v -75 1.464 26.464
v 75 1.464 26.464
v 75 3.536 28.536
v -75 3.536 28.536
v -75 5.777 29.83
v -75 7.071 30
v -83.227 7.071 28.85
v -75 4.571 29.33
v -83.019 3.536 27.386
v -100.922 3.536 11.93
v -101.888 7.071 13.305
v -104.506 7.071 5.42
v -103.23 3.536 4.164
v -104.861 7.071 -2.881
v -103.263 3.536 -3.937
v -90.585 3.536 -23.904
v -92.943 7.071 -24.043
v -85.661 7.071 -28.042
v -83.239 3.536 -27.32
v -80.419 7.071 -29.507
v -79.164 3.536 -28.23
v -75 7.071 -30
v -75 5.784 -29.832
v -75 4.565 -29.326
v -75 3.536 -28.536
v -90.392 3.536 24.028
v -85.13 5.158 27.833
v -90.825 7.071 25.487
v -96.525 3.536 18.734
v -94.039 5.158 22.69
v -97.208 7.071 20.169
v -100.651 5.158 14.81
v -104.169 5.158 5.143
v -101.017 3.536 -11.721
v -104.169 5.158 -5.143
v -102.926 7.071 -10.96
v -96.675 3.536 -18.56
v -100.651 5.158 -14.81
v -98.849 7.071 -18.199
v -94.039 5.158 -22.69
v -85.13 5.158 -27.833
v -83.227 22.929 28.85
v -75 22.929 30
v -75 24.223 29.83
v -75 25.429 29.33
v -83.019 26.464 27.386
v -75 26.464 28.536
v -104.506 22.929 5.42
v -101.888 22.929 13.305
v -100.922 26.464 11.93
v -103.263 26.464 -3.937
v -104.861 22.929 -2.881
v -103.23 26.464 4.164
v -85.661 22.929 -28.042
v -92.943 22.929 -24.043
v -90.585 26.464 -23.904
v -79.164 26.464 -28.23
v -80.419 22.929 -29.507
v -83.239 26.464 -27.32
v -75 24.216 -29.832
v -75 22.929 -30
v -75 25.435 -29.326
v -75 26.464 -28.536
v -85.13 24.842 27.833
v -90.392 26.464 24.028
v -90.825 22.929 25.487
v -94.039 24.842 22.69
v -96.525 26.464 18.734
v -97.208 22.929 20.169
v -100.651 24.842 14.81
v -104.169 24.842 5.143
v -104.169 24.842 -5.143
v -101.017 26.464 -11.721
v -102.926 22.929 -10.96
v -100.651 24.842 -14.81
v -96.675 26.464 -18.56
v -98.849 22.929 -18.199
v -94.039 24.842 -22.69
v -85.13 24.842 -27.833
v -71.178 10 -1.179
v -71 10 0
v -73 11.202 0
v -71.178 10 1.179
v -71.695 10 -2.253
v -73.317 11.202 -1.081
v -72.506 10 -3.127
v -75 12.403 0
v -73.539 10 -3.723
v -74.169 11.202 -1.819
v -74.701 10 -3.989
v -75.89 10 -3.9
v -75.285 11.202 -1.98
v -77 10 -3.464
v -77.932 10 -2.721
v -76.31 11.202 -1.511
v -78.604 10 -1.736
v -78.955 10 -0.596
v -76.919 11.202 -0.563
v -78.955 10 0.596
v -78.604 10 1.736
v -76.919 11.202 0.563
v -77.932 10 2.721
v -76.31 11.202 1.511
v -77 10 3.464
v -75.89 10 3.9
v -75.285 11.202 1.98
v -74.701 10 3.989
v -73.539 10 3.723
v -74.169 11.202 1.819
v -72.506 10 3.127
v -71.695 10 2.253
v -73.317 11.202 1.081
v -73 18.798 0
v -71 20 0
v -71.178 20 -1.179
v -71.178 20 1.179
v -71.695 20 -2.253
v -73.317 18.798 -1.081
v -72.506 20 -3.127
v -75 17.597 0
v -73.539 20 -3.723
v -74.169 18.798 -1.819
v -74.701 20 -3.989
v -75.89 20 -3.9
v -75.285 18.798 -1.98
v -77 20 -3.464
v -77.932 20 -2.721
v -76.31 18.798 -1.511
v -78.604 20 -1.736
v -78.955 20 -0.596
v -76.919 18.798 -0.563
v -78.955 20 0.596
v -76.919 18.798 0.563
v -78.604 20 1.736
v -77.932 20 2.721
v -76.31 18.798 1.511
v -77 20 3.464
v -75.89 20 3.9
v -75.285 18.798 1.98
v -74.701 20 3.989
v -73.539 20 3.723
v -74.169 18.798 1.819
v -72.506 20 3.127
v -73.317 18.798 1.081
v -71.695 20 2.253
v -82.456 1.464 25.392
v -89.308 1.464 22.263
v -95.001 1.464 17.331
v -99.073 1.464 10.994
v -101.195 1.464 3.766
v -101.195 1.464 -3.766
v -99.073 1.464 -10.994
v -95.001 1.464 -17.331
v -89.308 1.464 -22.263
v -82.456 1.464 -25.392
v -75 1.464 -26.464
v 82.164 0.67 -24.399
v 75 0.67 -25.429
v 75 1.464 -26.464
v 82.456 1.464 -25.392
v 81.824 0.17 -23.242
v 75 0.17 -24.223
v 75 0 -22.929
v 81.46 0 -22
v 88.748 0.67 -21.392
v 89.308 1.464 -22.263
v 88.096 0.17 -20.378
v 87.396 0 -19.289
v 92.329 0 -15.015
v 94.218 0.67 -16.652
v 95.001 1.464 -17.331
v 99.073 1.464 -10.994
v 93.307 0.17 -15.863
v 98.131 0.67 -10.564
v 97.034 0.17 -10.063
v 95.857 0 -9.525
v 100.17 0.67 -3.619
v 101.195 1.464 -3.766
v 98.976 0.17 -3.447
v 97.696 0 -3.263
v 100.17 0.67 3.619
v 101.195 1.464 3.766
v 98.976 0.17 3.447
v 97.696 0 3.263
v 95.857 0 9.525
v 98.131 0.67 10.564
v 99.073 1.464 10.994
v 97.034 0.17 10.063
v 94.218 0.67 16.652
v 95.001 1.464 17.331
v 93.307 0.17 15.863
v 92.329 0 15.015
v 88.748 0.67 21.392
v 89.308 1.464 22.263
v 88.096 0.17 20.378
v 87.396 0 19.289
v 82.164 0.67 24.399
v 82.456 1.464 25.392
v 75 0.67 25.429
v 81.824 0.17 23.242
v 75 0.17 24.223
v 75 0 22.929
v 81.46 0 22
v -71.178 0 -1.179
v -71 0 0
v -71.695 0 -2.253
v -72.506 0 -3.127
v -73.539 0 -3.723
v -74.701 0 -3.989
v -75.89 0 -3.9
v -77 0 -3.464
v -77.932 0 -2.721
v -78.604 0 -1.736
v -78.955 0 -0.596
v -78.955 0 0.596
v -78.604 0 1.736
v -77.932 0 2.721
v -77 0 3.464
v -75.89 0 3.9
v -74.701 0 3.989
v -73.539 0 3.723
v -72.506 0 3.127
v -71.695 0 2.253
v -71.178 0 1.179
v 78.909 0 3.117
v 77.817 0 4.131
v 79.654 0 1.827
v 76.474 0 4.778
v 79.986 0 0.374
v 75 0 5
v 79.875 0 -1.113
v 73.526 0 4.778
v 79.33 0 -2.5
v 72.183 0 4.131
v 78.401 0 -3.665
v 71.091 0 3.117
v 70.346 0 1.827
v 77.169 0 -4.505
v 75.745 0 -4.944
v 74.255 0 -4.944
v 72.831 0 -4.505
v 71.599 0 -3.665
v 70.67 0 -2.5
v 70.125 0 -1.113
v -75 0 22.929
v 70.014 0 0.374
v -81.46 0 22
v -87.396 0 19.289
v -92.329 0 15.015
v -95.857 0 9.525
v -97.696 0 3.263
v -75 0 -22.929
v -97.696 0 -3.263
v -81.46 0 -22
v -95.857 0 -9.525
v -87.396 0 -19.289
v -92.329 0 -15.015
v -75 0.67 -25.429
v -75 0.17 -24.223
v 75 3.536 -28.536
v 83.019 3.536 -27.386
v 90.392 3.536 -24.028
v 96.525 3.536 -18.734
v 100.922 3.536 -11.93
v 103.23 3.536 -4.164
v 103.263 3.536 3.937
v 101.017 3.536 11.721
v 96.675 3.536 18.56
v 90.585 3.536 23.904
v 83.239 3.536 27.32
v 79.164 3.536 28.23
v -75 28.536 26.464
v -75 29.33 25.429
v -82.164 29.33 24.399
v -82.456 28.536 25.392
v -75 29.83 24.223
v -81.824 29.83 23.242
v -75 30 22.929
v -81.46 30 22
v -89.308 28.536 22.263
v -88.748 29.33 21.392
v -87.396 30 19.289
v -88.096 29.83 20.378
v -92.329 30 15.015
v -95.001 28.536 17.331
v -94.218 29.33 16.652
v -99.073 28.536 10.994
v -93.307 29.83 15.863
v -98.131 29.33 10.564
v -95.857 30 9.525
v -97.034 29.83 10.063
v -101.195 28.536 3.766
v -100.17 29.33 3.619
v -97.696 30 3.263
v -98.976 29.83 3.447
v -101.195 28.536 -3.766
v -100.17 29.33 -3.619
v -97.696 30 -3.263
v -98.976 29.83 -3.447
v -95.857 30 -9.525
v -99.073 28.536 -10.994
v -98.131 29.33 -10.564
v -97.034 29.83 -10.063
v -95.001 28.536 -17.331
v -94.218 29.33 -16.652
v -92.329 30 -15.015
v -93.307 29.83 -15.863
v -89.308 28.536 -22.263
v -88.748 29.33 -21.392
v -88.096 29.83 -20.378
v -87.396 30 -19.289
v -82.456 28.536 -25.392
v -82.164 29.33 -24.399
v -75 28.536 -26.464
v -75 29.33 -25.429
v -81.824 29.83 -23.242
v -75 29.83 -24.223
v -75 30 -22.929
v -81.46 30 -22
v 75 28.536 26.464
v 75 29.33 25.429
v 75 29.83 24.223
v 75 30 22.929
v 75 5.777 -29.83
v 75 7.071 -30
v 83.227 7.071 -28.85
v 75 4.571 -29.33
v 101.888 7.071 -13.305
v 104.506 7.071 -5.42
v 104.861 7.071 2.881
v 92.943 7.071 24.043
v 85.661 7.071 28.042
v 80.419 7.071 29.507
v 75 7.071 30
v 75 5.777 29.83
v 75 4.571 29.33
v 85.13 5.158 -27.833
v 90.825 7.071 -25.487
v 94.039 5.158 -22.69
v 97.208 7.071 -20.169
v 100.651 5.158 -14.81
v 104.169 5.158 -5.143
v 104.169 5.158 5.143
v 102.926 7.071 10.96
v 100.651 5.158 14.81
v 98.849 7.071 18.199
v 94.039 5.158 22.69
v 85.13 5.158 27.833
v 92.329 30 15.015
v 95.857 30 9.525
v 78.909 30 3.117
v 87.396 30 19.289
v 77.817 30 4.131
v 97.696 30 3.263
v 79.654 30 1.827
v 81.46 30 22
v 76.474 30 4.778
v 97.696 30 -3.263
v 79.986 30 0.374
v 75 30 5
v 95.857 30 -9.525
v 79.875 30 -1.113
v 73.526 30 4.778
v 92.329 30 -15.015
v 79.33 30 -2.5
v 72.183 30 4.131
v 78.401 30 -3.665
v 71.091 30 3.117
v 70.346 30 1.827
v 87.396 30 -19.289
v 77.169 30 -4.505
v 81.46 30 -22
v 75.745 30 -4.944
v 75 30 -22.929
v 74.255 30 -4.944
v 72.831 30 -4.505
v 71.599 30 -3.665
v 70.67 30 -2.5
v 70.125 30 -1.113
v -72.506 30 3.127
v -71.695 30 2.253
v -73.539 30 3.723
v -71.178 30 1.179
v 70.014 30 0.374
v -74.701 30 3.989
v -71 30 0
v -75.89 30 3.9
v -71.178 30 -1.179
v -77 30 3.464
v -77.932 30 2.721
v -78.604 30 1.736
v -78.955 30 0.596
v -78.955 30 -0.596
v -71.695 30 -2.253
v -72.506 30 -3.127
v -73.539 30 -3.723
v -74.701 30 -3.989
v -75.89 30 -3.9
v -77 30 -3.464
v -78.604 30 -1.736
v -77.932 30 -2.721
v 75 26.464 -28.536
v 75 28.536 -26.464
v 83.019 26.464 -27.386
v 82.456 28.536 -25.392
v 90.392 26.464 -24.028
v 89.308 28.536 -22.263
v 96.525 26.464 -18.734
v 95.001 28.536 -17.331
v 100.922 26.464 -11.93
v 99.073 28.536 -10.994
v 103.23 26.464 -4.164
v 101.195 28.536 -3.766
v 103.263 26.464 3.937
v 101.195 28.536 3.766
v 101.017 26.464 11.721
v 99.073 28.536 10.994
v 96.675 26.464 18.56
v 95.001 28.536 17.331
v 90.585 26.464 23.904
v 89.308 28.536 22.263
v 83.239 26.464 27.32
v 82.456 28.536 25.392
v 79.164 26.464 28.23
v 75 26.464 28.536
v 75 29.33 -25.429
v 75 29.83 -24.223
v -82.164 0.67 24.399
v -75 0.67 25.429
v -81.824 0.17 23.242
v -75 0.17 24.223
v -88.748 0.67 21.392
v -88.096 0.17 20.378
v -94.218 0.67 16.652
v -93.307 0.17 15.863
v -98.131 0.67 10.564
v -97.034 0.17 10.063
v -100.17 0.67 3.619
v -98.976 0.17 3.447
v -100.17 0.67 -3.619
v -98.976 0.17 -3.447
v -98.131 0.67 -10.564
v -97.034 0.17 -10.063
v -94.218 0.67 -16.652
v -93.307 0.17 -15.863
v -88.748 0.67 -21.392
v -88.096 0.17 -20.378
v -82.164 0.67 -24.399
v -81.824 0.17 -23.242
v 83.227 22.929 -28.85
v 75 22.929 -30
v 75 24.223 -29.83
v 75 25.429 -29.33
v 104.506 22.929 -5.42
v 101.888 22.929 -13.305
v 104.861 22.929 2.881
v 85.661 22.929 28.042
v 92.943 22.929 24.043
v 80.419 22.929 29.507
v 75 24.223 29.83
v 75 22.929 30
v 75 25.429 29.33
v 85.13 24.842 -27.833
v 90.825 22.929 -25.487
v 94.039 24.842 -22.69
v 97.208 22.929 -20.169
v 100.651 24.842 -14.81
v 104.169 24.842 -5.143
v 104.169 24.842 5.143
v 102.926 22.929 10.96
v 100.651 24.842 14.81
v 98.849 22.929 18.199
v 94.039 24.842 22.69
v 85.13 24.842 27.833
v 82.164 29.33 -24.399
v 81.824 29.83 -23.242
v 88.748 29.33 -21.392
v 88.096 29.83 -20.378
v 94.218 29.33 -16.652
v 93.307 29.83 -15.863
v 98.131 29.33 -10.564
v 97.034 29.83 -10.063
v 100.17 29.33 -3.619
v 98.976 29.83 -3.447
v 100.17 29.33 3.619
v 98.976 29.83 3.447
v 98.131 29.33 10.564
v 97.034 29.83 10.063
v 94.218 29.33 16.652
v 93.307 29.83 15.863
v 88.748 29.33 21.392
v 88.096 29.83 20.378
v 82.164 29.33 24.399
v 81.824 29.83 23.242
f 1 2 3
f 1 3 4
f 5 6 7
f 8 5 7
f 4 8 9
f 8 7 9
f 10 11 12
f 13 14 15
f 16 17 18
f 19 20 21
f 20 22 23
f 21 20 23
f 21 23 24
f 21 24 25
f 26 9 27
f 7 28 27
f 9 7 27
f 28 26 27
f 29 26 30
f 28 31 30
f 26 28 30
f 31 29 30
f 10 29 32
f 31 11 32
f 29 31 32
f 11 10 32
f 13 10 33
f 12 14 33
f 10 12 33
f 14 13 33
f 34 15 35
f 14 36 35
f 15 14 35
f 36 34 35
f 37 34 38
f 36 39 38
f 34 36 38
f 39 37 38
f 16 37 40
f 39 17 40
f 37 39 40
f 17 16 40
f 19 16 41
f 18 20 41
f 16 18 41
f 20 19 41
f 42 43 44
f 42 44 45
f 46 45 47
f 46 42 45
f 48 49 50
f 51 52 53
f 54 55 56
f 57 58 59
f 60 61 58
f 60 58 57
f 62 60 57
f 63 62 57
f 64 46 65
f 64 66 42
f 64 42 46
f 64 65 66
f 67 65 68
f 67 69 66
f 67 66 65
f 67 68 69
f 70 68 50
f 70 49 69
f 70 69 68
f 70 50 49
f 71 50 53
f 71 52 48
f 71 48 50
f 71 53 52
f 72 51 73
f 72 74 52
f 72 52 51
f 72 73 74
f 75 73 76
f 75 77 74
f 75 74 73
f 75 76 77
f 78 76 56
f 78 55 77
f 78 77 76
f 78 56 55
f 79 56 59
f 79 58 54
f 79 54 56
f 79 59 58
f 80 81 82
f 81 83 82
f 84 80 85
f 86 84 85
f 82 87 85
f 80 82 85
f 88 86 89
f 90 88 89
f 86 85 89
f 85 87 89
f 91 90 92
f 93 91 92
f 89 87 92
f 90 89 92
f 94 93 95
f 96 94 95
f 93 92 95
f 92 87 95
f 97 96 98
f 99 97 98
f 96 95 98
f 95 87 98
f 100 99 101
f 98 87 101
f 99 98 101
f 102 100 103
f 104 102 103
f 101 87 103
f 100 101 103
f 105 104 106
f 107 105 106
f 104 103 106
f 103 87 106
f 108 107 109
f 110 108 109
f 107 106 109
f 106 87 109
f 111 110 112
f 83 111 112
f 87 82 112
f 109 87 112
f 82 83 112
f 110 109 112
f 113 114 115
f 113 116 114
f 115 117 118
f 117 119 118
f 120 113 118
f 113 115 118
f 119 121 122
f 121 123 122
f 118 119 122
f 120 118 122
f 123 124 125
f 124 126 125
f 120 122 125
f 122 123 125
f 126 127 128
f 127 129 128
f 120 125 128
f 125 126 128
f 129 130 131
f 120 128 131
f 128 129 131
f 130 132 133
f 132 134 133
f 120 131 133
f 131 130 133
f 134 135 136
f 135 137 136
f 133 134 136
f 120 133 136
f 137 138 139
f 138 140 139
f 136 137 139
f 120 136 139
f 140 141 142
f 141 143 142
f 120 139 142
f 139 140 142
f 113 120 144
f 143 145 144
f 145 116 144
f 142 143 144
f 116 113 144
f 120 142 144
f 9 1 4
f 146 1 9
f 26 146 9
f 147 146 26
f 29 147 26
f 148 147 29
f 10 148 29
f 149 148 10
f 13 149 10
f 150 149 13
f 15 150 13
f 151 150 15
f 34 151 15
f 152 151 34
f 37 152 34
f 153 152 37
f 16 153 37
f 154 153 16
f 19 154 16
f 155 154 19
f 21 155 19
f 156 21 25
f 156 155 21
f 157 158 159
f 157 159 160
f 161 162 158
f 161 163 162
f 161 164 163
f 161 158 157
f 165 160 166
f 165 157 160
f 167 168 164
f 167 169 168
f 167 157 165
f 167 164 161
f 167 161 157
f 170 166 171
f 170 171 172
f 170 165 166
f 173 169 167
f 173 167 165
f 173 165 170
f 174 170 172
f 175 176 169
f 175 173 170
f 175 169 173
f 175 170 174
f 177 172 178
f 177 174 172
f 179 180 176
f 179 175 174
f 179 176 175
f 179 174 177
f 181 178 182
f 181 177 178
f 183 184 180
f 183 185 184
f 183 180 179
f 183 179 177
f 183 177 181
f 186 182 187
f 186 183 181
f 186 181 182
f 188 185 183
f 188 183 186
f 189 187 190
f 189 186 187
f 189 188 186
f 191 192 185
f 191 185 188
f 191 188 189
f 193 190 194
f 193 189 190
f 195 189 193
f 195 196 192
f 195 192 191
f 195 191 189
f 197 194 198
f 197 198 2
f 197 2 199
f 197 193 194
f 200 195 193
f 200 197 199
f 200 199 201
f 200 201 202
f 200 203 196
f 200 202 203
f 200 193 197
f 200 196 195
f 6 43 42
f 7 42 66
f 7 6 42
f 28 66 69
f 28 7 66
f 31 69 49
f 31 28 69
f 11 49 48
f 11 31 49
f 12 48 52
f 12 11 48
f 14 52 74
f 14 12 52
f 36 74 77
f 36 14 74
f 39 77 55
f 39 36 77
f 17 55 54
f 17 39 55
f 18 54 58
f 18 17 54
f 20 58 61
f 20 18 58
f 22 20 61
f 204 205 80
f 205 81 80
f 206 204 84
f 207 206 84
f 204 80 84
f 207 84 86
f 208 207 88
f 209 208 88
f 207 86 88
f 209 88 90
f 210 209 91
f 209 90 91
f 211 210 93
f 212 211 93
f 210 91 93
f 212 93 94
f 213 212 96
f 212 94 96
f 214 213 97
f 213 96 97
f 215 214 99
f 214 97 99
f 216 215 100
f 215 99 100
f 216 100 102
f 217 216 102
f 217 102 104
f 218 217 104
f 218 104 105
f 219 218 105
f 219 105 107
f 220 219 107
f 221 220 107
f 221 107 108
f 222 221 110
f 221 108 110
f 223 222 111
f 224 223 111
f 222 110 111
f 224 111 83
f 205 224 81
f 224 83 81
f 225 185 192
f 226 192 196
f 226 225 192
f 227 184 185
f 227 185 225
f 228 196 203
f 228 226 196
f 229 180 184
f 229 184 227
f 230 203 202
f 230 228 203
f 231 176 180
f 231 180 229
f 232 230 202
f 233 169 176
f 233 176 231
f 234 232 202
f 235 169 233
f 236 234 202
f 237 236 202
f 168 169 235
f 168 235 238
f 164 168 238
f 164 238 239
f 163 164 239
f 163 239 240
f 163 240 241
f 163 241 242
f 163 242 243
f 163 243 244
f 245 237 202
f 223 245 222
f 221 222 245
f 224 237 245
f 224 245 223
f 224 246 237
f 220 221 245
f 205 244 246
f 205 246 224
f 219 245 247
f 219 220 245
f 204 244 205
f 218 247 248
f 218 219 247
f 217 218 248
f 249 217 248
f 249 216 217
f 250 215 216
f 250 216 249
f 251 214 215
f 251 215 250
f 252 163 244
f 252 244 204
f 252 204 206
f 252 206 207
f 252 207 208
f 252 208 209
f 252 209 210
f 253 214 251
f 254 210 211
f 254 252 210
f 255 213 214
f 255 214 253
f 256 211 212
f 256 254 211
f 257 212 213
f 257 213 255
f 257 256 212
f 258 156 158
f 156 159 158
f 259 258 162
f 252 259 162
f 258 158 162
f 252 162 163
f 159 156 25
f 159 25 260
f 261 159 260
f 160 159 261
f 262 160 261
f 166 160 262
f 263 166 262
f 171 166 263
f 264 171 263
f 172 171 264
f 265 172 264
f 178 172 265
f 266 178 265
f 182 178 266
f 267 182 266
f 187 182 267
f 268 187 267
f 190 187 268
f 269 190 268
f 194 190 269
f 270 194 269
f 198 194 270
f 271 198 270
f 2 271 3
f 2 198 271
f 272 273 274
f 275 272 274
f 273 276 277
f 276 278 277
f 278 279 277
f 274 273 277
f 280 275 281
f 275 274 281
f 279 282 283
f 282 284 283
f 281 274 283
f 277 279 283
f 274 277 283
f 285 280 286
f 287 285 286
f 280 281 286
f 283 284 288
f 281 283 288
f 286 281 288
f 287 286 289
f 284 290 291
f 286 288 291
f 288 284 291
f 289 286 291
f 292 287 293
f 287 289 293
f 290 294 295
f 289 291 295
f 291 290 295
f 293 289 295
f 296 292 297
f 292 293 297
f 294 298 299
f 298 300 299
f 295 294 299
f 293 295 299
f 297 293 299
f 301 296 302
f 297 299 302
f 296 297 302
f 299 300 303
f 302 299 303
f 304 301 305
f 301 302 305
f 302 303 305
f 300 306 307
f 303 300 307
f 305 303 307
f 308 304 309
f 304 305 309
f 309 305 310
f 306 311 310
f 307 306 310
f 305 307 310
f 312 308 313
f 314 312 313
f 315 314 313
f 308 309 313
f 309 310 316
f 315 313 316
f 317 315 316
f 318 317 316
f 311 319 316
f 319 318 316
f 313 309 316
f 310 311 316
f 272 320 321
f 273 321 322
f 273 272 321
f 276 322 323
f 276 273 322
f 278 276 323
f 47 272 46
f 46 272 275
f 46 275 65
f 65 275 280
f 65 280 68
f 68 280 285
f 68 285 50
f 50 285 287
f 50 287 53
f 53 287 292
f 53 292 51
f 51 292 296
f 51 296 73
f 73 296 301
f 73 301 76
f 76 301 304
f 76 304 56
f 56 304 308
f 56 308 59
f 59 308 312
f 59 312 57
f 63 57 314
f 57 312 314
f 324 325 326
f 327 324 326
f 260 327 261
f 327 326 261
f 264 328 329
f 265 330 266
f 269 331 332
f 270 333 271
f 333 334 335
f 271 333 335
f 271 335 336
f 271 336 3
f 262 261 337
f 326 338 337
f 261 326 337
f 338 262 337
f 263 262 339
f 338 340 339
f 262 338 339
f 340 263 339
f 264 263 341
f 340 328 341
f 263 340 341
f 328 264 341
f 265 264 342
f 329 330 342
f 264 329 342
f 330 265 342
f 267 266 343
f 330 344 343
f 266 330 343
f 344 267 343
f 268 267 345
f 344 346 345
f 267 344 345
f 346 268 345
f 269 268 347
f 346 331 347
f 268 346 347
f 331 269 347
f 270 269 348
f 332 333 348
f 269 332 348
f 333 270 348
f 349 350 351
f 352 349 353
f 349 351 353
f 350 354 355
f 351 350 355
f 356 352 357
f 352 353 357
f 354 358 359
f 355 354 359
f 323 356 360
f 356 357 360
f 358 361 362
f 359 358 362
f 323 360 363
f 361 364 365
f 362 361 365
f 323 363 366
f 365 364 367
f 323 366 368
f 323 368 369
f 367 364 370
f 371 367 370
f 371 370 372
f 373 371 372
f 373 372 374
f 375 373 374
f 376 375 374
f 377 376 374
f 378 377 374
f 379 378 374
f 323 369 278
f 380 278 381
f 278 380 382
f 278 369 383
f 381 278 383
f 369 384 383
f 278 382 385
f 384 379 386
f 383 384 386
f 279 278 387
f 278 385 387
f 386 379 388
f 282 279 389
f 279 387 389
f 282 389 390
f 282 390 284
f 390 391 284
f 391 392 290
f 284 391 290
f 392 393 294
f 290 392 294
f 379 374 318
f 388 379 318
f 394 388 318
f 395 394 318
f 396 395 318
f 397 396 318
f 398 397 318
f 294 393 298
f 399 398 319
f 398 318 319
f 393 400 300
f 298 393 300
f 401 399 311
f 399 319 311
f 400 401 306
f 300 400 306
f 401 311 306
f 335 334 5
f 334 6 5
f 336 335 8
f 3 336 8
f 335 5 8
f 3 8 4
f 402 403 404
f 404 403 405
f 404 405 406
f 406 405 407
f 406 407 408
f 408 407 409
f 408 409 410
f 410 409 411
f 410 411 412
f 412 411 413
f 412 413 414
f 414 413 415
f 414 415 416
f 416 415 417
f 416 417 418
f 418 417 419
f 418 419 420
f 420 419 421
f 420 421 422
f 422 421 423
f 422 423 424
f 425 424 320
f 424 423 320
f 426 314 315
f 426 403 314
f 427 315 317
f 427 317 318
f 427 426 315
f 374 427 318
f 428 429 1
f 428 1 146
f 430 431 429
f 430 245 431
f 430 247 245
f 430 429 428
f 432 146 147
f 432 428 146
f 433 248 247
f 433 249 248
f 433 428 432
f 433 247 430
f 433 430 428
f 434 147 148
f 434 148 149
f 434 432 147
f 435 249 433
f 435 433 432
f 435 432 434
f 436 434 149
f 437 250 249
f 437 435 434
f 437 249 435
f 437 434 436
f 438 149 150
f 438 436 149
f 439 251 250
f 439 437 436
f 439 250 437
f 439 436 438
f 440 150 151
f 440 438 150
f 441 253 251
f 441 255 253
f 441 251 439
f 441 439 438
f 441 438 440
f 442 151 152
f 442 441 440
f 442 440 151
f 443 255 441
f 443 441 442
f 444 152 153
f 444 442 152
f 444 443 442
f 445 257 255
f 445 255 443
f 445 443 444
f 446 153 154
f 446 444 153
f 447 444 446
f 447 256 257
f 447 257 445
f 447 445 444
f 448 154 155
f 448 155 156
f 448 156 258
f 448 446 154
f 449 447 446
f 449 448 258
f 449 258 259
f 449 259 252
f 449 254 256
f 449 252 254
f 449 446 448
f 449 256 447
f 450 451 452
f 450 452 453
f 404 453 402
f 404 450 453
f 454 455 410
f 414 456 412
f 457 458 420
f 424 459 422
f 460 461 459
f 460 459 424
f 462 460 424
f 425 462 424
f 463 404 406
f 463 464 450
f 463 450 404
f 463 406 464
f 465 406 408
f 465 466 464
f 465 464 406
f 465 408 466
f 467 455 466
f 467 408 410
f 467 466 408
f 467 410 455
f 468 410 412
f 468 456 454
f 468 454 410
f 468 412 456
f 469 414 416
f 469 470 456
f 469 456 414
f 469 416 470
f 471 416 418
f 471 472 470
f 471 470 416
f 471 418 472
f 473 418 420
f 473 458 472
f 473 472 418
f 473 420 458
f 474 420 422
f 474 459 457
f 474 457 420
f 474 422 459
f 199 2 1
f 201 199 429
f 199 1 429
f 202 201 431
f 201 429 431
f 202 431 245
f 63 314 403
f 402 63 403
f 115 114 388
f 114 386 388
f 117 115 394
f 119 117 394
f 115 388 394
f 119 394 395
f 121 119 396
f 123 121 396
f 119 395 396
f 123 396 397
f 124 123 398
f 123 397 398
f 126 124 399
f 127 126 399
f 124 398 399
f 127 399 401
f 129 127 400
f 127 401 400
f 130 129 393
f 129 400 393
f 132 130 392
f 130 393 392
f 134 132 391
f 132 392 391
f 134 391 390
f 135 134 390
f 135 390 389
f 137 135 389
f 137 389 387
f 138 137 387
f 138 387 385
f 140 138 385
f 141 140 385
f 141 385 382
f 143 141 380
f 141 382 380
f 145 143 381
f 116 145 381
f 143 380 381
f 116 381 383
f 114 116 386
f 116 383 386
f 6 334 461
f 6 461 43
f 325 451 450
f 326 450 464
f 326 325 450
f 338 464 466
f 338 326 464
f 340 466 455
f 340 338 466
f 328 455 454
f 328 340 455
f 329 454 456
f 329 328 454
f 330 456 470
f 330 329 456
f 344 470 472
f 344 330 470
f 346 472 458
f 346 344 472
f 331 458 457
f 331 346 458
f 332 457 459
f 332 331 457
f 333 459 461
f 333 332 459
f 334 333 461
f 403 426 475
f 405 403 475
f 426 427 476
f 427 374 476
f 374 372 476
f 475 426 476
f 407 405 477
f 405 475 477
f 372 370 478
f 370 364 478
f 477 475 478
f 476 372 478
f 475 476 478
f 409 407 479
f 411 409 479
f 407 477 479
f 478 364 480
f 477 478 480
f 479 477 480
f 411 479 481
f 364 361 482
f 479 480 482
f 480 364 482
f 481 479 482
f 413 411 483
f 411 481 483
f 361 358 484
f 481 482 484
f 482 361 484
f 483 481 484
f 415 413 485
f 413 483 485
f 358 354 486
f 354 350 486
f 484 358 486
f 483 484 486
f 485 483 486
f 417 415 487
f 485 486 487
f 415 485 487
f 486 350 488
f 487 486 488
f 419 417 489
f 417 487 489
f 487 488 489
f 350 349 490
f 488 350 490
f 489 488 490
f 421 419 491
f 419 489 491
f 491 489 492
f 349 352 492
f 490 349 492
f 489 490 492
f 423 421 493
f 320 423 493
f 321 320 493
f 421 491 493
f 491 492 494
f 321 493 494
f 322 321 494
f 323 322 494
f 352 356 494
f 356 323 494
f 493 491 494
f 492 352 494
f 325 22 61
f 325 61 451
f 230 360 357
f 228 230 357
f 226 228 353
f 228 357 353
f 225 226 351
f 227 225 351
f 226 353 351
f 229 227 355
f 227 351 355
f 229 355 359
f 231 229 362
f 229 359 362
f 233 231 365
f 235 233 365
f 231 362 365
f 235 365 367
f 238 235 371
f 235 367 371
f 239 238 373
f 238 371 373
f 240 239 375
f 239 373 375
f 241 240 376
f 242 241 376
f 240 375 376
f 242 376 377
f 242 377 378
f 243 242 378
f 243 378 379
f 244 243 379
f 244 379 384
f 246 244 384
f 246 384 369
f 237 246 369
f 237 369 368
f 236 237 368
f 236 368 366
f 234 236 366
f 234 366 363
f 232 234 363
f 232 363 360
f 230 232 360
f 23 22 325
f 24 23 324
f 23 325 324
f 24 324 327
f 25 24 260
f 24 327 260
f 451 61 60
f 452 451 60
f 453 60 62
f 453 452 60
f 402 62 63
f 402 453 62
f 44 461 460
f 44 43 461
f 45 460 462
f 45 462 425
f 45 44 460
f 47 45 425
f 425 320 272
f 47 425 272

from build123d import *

# Parameters (mm, degrees)
BOSS_EXTRUDE1_DEPTH = 30
SKETCH2_R           = 5
CUT_EXTRUDE1_DEPTH  = 114.247516529
CHAMFER1_SIZE       = 5
FILLET1_R           = 5


# Read off the part's stored shape, not the designer's step: Ø8.0mm Dowel Hole1
with BuildPart() as part:
    # Sketch1 → Boss-Extrude1 (new body)
    with BuildSketch(Plane(origin=(0, 0, 0), x_dir=(1, 0, 0), z_dir=(0, 1, 0))):
        with BuildLine():
            Line((-75, 30), (75, 30))
            ThreePointArc((75, 30), (105, 0), (75, -30))
            Line((75, -30), (-75, -30))
            ThreePointArc((-75, -30), (-105, 0), (-75, 30))
        make_face()
    extrude(amount=BOSS_EXTRUDE1_DEPTH)

    # Sketch2 → Cut-Extrude1 (cut, through all)
    with BuildSketch(Plane(origin=(0, 30, 0), x_dir=(1, 0, 0), z_dir=(0, 1, 0))):
        with Locations(Location((75, 0, 0), (0, 0, 270))):
            Circle(SKETCH2_R)
    extrude(amount=-CUT_EXTRUDE1_DEPTH, mode=Mode.SUBTRACT)

    # Chamfer1
    chamfer1_edges = [part.edges().sort_by_distance(p)[0] for p in [
        (105, 30, 0),
        (0, 30, -30),
        (-105, 30, 0),
        (0, 0, -30),
        (105, 0, 0),
        (0, 0, 30),
        (-105, 0, 0),
        (0, 30, 30),
    ]]
    chamfer(chamfer1_edges, length=CHAMFER1_SIZE)

    # Fillet1
    fillet1_edges = [part.edges().sort_by_distance(p)[0] for p in [
        (0, 25, 30),
        (0, 5, 30),
        (0, 0, -25),
        (-100, 0, 0),
        (100, 0, 0),
        (0, 0, 25),
        (105, 25, 0),
        (105, 5, 0),
        (-105, 25, 0),
        (-105, 5, 0),
        (0, 25, -30),
        (0, 5, -30),
        (0, 30, -25),
        (-100, 30, 0),
        (100, 30, 0),
        (0, 30, 25),
    ]]
    fillet(fillet1_edges, radius=FILLET1_R)

    # Ø8.0mm Dowel Hole1 outline → Ø8.0mm Dowel Hole1 (revolve, cut)
    with BuildSketch(Plane(origin=(-75, 0, 0), x_dir=(1, 0, 0), z_dir=(0, 0, 1))):
        Polygon((0, 30), (0, 17.596557524), (4, 20), (4, 30), align=None)
        Polygon((4, 10), (0, 12.403442476), (0, 0), (4, 0), align=None)
    revolve(axis=Axis((-75, 0, 0), (0, 1, 0)), mode=Mode.SUBTRACT)


solid = part.part
